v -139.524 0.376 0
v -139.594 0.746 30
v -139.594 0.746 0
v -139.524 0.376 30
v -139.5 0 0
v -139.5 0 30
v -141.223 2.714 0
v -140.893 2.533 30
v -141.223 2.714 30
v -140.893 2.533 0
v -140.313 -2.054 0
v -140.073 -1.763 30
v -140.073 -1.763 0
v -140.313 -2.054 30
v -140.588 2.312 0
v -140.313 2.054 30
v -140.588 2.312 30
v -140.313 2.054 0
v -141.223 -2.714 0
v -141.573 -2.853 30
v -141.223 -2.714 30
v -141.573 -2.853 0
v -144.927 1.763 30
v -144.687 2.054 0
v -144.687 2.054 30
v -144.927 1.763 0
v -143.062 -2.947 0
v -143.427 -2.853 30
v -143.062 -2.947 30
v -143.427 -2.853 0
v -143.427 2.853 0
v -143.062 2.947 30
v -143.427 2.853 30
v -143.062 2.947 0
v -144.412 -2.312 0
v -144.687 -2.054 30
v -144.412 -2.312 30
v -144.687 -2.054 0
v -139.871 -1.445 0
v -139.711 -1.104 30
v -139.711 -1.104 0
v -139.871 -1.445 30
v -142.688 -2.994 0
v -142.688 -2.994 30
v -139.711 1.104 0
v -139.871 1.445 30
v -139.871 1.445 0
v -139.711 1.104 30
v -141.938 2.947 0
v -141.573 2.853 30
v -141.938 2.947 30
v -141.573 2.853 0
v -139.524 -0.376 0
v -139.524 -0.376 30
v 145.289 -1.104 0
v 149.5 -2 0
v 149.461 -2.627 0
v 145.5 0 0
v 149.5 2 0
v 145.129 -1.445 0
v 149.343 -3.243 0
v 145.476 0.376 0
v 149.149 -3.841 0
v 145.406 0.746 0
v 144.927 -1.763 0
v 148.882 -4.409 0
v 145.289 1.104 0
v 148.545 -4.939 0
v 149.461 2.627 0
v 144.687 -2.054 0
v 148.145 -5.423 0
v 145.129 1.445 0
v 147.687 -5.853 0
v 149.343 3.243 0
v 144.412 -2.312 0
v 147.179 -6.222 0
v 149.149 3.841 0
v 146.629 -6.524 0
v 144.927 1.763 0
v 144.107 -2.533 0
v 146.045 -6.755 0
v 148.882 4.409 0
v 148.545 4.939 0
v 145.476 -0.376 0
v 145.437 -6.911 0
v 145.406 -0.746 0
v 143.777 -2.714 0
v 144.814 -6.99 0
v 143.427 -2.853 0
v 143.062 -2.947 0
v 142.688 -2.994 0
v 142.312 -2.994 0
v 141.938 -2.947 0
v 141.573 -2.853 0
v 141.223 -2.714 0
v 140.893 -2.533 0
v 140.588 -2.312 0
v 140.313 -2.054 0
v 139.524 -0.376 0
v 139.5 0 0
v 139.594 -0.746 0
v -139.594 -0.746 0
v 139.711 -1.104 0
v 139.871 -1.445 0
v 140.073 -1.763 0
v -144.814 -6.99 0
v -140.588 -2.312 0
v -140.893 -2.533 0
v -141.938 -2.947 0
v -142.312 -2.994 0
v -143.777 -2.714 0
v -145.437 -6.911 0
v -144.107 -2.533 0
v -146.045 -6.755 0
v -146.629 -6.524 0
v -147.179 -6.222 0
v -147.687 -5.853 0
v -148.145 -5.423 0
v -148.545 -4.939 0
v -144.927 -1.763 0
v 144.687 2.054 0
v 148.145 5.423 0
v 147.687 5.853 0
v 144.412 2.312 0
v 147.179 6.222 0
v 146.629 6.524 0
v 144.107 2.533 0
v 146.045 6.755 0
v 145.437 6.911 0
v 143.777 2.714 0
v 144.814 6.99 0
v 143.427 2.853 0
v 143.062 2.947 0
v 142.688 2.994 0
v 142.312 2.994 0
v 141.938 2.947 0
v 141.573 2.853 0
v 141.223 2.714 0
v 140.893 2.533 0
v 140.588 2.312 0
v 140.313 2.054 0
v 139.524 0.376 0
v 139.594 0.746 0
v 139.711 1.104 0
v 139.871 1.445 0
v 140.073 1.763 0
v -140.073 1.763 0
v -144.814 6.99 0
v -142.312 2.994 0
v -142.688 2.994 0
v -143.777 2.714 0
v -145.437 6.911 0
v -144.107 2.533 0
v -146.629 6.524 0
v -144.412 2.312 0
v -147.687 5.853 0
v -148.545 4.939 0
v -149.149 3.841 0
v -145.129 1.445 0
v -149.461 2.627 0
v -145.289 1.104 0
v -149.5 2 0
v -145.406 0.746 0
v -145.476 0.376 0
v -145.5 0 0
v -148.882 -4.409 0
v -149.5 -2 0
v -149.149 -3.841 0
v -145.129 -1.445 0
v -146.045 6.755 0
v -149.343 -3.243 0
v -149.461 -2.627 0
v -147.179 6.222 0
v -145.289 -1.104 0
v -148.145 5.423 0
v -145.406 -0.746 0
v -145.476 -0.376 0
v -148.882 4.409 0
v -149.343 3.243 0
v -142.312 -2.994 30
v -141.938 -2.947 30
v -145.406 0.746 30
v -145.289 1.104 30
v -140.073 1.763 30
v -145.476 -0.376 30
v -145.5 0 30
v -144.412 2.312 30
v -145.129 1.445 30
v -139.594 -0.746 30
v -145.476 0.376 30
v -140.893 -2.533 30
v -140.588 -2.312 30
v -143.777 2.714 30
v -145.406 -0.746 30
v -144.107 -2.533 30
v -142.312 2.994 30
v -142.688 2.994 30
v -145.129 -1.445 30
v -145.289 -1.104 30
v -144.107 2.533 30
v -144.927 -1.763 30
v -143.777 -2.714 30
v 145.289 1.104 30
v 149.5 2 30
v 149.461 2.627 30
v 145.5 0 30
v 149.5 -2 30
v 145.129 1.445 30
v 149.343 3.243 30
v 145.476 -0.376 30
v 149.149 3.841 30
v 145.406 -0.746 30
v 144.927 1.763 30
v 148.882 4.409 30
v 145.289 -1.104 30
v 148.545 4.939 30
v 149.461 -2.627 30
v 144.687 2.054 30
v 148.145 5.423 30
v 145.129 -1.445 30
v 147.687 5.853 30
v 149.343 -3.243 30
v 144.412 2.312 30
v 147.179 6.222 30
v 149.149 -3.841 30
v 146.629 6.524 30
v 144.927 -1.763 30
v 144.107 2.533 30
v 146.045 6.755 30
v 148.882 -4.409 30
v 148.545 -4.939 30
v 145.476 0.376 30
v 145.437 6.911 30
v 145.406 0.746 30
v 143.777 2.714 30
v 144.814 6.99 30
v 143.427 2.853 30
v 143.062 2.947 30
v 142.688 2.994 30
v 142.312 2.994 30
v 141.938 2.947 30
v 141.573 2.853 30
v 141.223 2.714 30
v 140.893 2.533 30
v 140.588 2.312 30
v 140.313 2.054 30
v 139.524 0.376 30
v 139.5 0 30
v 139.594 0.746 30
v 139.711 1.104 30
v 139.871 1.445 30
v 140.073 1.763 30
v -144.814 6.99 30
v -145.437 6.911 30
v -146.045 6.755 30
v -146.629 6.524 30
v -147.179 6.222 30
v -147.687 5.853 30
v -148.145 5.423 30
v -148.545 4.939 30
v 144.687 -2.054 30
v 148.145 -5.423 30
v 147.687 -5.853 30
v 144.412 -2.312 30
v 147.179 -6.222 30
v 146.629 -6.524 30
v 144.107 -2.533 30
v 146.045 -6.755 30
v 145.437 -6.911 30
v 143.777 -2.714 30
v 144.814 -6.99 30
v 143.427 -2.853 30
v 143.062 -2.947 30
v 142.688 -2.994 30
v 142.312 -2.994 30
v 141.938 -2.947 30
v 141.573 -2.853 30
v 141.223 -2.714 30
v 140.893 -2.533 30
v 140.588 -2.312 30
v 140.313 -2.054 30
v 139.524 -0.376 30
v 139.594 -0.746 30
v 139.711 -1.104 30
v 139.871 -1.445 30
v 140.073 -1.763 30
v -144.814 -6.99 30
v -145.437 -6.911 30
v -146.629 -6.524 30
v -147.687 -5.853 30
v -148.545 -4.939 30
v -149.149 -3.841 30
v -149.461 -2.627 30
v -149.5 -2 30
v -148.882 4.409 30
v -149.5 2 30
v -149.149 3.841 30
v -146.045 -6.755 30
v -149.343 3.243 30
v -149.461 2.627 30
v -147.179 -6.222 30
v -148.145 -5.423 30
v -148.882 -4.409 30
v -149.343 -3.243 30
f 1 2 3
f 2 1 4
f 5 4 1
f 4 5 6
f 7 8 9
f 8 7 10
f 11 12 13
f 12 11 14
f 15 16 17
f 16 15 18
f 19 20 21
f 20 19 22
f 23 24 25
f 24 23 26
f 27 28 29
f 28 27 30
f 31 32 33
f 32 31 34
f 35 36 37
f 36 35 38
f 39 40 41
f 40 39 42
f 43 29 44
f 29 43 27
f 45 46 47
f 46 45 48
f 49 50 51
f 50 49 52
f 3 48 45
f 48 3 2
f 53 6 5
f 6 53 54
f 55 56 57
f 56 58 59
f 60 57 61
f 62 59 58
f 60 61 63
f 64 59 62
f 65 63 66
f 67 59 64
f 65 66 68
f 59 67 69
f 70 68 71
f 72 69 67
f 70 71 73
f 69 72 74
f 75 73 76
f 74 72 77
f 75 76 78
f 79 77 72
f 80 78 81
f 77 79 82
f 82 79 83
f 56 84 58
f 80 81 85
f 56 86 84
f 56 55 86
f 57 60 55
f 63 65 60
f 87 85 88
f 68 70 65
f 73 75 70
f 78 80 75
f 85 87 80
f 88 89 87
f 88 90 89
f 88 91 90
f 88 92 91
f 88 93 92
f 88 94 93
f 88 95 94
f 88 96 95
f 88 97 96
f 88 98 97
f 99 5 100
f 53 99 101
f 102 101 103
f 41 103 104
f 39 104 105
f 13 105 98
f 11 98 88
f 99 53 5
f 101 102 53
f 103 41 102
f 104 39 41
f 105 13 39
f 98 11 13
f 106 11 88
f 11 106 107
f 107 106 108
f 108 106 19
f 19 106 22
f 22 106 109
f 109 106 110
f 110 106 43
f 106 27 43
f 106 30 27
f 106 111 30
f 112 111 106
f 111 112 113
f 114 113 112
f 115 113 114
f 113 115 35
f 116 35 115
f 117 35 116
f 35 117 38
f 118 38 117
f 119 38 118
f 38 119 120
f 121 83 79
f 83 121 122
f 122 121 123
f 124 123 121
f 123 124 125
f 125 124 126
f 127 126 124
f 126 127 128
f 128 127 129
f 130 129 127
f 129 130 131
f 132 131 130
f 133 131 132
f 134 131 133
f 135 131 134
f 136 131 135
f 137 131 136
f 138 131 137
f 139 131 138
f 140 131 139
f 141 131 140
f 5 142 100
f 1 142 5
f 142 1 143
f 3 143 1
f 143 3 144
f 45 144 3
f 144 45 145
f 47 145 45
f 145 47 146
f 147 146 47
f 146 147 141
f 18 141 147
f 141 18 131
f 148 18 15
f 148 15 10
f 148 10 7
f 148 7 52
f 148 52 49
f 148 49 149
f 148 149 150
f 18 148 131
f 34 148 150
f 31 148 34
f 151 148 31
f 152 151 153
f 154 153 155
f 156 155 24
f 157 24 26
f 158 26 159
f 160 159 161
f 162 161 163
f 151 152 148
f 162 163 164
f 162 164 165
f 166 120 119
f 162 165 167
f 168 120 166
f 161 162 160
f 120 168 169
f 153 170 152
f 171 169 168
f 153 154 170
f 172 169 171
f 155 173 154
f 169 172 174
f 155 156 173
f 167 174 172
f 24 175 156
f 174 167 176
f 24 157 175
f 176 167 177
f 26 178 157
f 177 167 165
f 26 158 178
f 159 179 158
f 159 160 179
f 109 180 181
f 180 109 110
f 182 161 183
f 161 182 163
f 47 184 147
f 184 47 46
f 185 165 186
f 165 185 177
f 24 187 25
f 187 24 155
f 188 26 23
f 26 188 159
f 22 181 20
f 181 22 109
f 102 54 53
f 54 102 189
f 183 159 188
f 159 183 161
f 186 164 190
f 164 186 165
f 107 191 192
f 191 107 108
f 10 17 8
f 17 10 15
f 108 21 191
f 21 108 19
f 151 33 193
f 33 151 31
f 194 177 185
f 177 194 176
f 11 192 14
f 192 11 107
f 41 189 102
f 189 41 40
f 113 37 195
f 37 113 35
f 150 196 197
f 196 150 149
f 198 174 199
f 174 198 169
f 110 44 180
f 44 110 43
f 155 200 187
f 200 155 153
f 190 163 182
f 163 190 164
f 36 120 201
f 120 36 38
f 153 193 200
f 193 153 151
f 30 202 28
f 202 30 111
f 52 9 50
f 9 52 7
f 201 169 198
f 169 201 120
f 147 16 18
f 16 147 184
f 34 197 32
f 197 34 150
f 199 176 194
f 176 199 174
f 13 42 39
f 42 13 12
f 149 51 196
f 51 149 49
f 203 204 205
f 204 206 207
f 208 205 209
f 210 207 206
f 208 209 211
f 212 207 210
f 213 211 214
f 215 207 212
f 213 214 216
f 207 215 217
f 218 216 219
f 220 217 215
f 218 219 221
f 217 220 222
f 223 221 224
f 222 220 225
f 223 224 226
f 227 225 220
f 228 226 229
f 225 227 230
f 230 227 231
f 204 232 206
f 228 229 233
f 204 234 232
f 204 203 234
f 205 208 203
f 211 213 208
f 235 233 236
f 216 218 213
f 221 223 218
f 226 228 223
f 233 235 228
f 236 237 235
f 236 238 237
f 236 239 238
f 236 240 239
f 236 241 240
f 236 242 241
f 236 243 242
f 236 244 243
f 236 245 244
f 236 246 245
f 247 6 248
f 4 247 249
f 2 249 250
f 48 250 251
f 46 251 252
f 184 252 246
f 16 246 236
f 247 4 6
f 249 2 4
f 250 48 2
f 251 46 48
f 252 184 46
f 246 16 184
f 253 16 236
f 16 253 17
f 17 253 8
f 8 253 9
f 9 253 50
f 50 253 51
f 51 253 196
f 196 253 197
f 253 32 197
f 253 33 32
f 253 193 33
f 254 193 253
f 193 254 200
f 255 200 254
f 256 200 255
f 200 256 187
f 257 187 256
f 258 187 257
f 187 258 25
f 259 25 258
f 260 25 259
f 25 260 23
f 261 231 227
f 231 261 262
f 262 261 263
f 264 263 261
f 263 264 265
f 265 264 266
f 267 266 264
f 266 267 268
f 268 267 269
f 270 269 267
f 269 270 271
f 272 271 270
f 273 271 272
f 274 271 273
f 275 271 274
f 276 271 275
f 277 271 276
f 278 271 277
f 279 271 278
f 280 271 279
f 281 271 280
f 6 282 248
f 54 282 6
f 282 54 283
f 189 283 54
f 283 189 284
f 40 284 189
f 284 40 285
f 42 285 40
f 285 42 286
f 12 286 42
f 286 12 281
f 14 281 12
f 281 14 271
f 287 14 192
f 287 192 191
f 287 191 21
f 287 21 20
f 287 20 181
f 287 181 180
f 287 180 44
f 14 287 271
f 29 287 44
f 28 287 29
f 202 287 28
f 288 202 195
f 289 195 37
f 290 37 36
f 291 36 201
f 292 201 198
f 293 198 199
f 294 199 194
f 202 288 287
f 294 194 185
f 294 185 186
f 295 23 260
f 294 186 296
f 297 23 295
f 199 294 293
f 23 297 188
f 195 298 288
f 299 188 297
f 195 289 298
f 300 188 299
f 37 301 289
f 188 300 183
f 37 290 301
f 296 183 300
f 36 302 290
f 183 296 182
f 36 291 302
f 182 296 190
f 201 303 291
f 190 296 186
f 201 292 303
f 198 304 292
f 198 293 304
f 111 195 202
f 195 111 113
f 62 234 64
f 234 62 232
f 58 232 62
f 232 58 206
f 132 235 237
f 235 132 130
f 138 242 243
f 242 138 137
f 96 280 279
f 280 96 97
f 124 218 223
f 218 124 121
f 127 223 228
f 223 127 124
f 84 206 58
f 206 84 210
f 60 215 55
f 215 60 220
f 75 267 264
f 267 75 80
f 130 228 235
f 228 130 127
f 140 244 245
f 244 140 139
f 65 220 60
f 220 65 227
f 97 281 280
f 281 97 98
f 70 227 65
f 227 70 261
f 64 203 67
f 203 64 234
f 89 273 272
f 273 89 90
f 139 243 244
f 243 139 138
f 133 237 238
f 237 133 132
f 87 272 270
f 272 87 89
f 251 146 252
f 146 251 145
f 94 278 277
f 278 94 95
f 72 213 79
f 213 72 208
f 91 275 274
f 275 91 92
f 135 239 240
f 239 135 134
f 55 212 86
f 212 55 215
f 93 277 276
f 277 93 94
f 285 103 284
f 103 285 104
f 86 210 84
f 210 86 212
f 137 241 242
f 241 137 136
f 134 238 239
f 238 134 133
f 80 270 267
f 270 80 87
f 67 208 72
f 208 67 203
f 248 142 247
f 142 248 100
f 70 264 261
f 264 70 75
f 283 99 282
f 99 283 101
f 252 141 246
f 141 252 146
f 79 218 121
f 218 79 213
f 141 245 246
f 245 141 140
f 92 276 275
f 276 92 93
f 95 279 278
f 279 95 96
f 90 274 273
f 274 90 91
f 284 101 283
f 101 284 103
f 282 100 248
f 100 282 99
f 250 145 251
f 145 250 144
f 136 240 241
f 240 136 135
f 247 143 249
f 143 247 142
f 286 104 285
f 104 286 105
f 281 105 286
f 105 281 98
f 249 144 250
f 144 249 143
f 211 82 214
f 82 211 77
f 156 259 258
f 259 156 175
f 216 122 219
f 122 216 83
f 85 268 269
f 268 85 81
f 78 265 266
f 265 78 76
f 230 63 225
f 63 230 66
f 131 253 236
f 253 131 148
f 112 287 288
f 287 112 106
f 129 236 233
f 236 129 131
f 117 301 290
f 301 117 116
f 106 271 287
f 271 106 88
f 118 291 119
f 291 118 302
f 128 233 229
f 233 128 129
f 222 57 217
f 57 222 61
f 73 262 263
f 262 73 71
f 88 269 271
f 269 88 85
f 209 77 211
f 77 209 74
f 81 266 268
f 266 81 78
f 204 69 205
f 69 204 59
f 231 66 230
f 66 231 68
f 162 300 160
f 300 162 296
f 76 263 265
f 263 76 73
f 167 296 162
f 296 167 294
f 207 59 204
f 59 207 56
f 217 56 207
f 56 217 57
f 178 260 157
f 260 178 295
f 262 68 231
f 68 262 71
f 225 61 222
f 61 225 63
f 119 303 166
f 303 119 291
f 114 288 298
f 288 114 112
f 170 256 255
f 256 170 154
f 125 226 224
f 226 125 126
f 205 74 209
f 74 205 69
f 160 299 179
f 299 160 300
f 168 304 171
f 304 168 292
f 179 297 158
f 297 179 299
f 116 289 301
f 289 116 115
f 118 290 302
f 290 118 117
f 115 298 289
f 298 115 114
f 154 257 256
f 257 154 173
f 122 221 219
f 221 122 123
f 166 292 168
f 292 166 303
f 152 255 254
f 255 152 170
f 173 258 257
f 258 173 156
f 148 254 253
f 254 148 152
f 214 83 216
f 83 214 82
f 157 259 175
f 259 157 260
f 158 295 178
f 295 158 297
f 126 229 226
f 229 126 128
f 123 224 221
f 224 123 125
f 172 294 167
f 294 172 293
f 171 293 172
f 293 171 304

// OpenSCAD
$fn = 50;


difference() {
	union() {
		hull() {
			translate(v = [-144.5000000000, 2.0000000000, 0]) {
				cylinder(h = 30, r = 5);
			}
			translate(v = [144.5000000000, 2.0000000000, 0]) {
				cylinder(h = 30, r = 5);
			}
			translate(v = [-144.5000000000, -2.0000000000, 0]) {
				cylinder(h = 30, r = 5);
			}
			translate(v = [144.5000000000, -2.0000000000, 0]) {
				cylinder(h = 30, r = 5);
			}
		}
	}
	union() {
		translate(v = [-142.5000000000, 0.0000000000, 0]) {
			cylinder(h = 30, r = 3.0000000000);
		}
		translate(v = [142.5000000000, 0.0000000000, 0]) {
			cylinder(h = 30, r = 3.0000000000);
		}
		translate(v = [-142.5000000000, 0.0000000000, 0]) {
			cylinder(h = 30, r = 1.5000000000);
		}
		translate(v = [142.5000000000, 0.0000000000, 0]) {
			cylinder(h = 30, r = 1.5000000000);
		}
		translate(v = [-142.5000000000, 0.0000000000, 0]) {
			cylinder(h = 30, r = 1.5000000000);
		}
		translate(v = [142.5000000000, 0.0000000000, 0]) {
			cylinder(h = 30, r = 1.5000000000);
		}
		translate(v = [-142.5000000000, 0.0000000000, 0]) {
			cylinder(h = 30, r = 1.5000000000);
		}
		translate(v = [142.5000000000, 0.0000000000, 0]) {
			cylinder(h = 30, r = 1.5000000000);
		}
	}
}
